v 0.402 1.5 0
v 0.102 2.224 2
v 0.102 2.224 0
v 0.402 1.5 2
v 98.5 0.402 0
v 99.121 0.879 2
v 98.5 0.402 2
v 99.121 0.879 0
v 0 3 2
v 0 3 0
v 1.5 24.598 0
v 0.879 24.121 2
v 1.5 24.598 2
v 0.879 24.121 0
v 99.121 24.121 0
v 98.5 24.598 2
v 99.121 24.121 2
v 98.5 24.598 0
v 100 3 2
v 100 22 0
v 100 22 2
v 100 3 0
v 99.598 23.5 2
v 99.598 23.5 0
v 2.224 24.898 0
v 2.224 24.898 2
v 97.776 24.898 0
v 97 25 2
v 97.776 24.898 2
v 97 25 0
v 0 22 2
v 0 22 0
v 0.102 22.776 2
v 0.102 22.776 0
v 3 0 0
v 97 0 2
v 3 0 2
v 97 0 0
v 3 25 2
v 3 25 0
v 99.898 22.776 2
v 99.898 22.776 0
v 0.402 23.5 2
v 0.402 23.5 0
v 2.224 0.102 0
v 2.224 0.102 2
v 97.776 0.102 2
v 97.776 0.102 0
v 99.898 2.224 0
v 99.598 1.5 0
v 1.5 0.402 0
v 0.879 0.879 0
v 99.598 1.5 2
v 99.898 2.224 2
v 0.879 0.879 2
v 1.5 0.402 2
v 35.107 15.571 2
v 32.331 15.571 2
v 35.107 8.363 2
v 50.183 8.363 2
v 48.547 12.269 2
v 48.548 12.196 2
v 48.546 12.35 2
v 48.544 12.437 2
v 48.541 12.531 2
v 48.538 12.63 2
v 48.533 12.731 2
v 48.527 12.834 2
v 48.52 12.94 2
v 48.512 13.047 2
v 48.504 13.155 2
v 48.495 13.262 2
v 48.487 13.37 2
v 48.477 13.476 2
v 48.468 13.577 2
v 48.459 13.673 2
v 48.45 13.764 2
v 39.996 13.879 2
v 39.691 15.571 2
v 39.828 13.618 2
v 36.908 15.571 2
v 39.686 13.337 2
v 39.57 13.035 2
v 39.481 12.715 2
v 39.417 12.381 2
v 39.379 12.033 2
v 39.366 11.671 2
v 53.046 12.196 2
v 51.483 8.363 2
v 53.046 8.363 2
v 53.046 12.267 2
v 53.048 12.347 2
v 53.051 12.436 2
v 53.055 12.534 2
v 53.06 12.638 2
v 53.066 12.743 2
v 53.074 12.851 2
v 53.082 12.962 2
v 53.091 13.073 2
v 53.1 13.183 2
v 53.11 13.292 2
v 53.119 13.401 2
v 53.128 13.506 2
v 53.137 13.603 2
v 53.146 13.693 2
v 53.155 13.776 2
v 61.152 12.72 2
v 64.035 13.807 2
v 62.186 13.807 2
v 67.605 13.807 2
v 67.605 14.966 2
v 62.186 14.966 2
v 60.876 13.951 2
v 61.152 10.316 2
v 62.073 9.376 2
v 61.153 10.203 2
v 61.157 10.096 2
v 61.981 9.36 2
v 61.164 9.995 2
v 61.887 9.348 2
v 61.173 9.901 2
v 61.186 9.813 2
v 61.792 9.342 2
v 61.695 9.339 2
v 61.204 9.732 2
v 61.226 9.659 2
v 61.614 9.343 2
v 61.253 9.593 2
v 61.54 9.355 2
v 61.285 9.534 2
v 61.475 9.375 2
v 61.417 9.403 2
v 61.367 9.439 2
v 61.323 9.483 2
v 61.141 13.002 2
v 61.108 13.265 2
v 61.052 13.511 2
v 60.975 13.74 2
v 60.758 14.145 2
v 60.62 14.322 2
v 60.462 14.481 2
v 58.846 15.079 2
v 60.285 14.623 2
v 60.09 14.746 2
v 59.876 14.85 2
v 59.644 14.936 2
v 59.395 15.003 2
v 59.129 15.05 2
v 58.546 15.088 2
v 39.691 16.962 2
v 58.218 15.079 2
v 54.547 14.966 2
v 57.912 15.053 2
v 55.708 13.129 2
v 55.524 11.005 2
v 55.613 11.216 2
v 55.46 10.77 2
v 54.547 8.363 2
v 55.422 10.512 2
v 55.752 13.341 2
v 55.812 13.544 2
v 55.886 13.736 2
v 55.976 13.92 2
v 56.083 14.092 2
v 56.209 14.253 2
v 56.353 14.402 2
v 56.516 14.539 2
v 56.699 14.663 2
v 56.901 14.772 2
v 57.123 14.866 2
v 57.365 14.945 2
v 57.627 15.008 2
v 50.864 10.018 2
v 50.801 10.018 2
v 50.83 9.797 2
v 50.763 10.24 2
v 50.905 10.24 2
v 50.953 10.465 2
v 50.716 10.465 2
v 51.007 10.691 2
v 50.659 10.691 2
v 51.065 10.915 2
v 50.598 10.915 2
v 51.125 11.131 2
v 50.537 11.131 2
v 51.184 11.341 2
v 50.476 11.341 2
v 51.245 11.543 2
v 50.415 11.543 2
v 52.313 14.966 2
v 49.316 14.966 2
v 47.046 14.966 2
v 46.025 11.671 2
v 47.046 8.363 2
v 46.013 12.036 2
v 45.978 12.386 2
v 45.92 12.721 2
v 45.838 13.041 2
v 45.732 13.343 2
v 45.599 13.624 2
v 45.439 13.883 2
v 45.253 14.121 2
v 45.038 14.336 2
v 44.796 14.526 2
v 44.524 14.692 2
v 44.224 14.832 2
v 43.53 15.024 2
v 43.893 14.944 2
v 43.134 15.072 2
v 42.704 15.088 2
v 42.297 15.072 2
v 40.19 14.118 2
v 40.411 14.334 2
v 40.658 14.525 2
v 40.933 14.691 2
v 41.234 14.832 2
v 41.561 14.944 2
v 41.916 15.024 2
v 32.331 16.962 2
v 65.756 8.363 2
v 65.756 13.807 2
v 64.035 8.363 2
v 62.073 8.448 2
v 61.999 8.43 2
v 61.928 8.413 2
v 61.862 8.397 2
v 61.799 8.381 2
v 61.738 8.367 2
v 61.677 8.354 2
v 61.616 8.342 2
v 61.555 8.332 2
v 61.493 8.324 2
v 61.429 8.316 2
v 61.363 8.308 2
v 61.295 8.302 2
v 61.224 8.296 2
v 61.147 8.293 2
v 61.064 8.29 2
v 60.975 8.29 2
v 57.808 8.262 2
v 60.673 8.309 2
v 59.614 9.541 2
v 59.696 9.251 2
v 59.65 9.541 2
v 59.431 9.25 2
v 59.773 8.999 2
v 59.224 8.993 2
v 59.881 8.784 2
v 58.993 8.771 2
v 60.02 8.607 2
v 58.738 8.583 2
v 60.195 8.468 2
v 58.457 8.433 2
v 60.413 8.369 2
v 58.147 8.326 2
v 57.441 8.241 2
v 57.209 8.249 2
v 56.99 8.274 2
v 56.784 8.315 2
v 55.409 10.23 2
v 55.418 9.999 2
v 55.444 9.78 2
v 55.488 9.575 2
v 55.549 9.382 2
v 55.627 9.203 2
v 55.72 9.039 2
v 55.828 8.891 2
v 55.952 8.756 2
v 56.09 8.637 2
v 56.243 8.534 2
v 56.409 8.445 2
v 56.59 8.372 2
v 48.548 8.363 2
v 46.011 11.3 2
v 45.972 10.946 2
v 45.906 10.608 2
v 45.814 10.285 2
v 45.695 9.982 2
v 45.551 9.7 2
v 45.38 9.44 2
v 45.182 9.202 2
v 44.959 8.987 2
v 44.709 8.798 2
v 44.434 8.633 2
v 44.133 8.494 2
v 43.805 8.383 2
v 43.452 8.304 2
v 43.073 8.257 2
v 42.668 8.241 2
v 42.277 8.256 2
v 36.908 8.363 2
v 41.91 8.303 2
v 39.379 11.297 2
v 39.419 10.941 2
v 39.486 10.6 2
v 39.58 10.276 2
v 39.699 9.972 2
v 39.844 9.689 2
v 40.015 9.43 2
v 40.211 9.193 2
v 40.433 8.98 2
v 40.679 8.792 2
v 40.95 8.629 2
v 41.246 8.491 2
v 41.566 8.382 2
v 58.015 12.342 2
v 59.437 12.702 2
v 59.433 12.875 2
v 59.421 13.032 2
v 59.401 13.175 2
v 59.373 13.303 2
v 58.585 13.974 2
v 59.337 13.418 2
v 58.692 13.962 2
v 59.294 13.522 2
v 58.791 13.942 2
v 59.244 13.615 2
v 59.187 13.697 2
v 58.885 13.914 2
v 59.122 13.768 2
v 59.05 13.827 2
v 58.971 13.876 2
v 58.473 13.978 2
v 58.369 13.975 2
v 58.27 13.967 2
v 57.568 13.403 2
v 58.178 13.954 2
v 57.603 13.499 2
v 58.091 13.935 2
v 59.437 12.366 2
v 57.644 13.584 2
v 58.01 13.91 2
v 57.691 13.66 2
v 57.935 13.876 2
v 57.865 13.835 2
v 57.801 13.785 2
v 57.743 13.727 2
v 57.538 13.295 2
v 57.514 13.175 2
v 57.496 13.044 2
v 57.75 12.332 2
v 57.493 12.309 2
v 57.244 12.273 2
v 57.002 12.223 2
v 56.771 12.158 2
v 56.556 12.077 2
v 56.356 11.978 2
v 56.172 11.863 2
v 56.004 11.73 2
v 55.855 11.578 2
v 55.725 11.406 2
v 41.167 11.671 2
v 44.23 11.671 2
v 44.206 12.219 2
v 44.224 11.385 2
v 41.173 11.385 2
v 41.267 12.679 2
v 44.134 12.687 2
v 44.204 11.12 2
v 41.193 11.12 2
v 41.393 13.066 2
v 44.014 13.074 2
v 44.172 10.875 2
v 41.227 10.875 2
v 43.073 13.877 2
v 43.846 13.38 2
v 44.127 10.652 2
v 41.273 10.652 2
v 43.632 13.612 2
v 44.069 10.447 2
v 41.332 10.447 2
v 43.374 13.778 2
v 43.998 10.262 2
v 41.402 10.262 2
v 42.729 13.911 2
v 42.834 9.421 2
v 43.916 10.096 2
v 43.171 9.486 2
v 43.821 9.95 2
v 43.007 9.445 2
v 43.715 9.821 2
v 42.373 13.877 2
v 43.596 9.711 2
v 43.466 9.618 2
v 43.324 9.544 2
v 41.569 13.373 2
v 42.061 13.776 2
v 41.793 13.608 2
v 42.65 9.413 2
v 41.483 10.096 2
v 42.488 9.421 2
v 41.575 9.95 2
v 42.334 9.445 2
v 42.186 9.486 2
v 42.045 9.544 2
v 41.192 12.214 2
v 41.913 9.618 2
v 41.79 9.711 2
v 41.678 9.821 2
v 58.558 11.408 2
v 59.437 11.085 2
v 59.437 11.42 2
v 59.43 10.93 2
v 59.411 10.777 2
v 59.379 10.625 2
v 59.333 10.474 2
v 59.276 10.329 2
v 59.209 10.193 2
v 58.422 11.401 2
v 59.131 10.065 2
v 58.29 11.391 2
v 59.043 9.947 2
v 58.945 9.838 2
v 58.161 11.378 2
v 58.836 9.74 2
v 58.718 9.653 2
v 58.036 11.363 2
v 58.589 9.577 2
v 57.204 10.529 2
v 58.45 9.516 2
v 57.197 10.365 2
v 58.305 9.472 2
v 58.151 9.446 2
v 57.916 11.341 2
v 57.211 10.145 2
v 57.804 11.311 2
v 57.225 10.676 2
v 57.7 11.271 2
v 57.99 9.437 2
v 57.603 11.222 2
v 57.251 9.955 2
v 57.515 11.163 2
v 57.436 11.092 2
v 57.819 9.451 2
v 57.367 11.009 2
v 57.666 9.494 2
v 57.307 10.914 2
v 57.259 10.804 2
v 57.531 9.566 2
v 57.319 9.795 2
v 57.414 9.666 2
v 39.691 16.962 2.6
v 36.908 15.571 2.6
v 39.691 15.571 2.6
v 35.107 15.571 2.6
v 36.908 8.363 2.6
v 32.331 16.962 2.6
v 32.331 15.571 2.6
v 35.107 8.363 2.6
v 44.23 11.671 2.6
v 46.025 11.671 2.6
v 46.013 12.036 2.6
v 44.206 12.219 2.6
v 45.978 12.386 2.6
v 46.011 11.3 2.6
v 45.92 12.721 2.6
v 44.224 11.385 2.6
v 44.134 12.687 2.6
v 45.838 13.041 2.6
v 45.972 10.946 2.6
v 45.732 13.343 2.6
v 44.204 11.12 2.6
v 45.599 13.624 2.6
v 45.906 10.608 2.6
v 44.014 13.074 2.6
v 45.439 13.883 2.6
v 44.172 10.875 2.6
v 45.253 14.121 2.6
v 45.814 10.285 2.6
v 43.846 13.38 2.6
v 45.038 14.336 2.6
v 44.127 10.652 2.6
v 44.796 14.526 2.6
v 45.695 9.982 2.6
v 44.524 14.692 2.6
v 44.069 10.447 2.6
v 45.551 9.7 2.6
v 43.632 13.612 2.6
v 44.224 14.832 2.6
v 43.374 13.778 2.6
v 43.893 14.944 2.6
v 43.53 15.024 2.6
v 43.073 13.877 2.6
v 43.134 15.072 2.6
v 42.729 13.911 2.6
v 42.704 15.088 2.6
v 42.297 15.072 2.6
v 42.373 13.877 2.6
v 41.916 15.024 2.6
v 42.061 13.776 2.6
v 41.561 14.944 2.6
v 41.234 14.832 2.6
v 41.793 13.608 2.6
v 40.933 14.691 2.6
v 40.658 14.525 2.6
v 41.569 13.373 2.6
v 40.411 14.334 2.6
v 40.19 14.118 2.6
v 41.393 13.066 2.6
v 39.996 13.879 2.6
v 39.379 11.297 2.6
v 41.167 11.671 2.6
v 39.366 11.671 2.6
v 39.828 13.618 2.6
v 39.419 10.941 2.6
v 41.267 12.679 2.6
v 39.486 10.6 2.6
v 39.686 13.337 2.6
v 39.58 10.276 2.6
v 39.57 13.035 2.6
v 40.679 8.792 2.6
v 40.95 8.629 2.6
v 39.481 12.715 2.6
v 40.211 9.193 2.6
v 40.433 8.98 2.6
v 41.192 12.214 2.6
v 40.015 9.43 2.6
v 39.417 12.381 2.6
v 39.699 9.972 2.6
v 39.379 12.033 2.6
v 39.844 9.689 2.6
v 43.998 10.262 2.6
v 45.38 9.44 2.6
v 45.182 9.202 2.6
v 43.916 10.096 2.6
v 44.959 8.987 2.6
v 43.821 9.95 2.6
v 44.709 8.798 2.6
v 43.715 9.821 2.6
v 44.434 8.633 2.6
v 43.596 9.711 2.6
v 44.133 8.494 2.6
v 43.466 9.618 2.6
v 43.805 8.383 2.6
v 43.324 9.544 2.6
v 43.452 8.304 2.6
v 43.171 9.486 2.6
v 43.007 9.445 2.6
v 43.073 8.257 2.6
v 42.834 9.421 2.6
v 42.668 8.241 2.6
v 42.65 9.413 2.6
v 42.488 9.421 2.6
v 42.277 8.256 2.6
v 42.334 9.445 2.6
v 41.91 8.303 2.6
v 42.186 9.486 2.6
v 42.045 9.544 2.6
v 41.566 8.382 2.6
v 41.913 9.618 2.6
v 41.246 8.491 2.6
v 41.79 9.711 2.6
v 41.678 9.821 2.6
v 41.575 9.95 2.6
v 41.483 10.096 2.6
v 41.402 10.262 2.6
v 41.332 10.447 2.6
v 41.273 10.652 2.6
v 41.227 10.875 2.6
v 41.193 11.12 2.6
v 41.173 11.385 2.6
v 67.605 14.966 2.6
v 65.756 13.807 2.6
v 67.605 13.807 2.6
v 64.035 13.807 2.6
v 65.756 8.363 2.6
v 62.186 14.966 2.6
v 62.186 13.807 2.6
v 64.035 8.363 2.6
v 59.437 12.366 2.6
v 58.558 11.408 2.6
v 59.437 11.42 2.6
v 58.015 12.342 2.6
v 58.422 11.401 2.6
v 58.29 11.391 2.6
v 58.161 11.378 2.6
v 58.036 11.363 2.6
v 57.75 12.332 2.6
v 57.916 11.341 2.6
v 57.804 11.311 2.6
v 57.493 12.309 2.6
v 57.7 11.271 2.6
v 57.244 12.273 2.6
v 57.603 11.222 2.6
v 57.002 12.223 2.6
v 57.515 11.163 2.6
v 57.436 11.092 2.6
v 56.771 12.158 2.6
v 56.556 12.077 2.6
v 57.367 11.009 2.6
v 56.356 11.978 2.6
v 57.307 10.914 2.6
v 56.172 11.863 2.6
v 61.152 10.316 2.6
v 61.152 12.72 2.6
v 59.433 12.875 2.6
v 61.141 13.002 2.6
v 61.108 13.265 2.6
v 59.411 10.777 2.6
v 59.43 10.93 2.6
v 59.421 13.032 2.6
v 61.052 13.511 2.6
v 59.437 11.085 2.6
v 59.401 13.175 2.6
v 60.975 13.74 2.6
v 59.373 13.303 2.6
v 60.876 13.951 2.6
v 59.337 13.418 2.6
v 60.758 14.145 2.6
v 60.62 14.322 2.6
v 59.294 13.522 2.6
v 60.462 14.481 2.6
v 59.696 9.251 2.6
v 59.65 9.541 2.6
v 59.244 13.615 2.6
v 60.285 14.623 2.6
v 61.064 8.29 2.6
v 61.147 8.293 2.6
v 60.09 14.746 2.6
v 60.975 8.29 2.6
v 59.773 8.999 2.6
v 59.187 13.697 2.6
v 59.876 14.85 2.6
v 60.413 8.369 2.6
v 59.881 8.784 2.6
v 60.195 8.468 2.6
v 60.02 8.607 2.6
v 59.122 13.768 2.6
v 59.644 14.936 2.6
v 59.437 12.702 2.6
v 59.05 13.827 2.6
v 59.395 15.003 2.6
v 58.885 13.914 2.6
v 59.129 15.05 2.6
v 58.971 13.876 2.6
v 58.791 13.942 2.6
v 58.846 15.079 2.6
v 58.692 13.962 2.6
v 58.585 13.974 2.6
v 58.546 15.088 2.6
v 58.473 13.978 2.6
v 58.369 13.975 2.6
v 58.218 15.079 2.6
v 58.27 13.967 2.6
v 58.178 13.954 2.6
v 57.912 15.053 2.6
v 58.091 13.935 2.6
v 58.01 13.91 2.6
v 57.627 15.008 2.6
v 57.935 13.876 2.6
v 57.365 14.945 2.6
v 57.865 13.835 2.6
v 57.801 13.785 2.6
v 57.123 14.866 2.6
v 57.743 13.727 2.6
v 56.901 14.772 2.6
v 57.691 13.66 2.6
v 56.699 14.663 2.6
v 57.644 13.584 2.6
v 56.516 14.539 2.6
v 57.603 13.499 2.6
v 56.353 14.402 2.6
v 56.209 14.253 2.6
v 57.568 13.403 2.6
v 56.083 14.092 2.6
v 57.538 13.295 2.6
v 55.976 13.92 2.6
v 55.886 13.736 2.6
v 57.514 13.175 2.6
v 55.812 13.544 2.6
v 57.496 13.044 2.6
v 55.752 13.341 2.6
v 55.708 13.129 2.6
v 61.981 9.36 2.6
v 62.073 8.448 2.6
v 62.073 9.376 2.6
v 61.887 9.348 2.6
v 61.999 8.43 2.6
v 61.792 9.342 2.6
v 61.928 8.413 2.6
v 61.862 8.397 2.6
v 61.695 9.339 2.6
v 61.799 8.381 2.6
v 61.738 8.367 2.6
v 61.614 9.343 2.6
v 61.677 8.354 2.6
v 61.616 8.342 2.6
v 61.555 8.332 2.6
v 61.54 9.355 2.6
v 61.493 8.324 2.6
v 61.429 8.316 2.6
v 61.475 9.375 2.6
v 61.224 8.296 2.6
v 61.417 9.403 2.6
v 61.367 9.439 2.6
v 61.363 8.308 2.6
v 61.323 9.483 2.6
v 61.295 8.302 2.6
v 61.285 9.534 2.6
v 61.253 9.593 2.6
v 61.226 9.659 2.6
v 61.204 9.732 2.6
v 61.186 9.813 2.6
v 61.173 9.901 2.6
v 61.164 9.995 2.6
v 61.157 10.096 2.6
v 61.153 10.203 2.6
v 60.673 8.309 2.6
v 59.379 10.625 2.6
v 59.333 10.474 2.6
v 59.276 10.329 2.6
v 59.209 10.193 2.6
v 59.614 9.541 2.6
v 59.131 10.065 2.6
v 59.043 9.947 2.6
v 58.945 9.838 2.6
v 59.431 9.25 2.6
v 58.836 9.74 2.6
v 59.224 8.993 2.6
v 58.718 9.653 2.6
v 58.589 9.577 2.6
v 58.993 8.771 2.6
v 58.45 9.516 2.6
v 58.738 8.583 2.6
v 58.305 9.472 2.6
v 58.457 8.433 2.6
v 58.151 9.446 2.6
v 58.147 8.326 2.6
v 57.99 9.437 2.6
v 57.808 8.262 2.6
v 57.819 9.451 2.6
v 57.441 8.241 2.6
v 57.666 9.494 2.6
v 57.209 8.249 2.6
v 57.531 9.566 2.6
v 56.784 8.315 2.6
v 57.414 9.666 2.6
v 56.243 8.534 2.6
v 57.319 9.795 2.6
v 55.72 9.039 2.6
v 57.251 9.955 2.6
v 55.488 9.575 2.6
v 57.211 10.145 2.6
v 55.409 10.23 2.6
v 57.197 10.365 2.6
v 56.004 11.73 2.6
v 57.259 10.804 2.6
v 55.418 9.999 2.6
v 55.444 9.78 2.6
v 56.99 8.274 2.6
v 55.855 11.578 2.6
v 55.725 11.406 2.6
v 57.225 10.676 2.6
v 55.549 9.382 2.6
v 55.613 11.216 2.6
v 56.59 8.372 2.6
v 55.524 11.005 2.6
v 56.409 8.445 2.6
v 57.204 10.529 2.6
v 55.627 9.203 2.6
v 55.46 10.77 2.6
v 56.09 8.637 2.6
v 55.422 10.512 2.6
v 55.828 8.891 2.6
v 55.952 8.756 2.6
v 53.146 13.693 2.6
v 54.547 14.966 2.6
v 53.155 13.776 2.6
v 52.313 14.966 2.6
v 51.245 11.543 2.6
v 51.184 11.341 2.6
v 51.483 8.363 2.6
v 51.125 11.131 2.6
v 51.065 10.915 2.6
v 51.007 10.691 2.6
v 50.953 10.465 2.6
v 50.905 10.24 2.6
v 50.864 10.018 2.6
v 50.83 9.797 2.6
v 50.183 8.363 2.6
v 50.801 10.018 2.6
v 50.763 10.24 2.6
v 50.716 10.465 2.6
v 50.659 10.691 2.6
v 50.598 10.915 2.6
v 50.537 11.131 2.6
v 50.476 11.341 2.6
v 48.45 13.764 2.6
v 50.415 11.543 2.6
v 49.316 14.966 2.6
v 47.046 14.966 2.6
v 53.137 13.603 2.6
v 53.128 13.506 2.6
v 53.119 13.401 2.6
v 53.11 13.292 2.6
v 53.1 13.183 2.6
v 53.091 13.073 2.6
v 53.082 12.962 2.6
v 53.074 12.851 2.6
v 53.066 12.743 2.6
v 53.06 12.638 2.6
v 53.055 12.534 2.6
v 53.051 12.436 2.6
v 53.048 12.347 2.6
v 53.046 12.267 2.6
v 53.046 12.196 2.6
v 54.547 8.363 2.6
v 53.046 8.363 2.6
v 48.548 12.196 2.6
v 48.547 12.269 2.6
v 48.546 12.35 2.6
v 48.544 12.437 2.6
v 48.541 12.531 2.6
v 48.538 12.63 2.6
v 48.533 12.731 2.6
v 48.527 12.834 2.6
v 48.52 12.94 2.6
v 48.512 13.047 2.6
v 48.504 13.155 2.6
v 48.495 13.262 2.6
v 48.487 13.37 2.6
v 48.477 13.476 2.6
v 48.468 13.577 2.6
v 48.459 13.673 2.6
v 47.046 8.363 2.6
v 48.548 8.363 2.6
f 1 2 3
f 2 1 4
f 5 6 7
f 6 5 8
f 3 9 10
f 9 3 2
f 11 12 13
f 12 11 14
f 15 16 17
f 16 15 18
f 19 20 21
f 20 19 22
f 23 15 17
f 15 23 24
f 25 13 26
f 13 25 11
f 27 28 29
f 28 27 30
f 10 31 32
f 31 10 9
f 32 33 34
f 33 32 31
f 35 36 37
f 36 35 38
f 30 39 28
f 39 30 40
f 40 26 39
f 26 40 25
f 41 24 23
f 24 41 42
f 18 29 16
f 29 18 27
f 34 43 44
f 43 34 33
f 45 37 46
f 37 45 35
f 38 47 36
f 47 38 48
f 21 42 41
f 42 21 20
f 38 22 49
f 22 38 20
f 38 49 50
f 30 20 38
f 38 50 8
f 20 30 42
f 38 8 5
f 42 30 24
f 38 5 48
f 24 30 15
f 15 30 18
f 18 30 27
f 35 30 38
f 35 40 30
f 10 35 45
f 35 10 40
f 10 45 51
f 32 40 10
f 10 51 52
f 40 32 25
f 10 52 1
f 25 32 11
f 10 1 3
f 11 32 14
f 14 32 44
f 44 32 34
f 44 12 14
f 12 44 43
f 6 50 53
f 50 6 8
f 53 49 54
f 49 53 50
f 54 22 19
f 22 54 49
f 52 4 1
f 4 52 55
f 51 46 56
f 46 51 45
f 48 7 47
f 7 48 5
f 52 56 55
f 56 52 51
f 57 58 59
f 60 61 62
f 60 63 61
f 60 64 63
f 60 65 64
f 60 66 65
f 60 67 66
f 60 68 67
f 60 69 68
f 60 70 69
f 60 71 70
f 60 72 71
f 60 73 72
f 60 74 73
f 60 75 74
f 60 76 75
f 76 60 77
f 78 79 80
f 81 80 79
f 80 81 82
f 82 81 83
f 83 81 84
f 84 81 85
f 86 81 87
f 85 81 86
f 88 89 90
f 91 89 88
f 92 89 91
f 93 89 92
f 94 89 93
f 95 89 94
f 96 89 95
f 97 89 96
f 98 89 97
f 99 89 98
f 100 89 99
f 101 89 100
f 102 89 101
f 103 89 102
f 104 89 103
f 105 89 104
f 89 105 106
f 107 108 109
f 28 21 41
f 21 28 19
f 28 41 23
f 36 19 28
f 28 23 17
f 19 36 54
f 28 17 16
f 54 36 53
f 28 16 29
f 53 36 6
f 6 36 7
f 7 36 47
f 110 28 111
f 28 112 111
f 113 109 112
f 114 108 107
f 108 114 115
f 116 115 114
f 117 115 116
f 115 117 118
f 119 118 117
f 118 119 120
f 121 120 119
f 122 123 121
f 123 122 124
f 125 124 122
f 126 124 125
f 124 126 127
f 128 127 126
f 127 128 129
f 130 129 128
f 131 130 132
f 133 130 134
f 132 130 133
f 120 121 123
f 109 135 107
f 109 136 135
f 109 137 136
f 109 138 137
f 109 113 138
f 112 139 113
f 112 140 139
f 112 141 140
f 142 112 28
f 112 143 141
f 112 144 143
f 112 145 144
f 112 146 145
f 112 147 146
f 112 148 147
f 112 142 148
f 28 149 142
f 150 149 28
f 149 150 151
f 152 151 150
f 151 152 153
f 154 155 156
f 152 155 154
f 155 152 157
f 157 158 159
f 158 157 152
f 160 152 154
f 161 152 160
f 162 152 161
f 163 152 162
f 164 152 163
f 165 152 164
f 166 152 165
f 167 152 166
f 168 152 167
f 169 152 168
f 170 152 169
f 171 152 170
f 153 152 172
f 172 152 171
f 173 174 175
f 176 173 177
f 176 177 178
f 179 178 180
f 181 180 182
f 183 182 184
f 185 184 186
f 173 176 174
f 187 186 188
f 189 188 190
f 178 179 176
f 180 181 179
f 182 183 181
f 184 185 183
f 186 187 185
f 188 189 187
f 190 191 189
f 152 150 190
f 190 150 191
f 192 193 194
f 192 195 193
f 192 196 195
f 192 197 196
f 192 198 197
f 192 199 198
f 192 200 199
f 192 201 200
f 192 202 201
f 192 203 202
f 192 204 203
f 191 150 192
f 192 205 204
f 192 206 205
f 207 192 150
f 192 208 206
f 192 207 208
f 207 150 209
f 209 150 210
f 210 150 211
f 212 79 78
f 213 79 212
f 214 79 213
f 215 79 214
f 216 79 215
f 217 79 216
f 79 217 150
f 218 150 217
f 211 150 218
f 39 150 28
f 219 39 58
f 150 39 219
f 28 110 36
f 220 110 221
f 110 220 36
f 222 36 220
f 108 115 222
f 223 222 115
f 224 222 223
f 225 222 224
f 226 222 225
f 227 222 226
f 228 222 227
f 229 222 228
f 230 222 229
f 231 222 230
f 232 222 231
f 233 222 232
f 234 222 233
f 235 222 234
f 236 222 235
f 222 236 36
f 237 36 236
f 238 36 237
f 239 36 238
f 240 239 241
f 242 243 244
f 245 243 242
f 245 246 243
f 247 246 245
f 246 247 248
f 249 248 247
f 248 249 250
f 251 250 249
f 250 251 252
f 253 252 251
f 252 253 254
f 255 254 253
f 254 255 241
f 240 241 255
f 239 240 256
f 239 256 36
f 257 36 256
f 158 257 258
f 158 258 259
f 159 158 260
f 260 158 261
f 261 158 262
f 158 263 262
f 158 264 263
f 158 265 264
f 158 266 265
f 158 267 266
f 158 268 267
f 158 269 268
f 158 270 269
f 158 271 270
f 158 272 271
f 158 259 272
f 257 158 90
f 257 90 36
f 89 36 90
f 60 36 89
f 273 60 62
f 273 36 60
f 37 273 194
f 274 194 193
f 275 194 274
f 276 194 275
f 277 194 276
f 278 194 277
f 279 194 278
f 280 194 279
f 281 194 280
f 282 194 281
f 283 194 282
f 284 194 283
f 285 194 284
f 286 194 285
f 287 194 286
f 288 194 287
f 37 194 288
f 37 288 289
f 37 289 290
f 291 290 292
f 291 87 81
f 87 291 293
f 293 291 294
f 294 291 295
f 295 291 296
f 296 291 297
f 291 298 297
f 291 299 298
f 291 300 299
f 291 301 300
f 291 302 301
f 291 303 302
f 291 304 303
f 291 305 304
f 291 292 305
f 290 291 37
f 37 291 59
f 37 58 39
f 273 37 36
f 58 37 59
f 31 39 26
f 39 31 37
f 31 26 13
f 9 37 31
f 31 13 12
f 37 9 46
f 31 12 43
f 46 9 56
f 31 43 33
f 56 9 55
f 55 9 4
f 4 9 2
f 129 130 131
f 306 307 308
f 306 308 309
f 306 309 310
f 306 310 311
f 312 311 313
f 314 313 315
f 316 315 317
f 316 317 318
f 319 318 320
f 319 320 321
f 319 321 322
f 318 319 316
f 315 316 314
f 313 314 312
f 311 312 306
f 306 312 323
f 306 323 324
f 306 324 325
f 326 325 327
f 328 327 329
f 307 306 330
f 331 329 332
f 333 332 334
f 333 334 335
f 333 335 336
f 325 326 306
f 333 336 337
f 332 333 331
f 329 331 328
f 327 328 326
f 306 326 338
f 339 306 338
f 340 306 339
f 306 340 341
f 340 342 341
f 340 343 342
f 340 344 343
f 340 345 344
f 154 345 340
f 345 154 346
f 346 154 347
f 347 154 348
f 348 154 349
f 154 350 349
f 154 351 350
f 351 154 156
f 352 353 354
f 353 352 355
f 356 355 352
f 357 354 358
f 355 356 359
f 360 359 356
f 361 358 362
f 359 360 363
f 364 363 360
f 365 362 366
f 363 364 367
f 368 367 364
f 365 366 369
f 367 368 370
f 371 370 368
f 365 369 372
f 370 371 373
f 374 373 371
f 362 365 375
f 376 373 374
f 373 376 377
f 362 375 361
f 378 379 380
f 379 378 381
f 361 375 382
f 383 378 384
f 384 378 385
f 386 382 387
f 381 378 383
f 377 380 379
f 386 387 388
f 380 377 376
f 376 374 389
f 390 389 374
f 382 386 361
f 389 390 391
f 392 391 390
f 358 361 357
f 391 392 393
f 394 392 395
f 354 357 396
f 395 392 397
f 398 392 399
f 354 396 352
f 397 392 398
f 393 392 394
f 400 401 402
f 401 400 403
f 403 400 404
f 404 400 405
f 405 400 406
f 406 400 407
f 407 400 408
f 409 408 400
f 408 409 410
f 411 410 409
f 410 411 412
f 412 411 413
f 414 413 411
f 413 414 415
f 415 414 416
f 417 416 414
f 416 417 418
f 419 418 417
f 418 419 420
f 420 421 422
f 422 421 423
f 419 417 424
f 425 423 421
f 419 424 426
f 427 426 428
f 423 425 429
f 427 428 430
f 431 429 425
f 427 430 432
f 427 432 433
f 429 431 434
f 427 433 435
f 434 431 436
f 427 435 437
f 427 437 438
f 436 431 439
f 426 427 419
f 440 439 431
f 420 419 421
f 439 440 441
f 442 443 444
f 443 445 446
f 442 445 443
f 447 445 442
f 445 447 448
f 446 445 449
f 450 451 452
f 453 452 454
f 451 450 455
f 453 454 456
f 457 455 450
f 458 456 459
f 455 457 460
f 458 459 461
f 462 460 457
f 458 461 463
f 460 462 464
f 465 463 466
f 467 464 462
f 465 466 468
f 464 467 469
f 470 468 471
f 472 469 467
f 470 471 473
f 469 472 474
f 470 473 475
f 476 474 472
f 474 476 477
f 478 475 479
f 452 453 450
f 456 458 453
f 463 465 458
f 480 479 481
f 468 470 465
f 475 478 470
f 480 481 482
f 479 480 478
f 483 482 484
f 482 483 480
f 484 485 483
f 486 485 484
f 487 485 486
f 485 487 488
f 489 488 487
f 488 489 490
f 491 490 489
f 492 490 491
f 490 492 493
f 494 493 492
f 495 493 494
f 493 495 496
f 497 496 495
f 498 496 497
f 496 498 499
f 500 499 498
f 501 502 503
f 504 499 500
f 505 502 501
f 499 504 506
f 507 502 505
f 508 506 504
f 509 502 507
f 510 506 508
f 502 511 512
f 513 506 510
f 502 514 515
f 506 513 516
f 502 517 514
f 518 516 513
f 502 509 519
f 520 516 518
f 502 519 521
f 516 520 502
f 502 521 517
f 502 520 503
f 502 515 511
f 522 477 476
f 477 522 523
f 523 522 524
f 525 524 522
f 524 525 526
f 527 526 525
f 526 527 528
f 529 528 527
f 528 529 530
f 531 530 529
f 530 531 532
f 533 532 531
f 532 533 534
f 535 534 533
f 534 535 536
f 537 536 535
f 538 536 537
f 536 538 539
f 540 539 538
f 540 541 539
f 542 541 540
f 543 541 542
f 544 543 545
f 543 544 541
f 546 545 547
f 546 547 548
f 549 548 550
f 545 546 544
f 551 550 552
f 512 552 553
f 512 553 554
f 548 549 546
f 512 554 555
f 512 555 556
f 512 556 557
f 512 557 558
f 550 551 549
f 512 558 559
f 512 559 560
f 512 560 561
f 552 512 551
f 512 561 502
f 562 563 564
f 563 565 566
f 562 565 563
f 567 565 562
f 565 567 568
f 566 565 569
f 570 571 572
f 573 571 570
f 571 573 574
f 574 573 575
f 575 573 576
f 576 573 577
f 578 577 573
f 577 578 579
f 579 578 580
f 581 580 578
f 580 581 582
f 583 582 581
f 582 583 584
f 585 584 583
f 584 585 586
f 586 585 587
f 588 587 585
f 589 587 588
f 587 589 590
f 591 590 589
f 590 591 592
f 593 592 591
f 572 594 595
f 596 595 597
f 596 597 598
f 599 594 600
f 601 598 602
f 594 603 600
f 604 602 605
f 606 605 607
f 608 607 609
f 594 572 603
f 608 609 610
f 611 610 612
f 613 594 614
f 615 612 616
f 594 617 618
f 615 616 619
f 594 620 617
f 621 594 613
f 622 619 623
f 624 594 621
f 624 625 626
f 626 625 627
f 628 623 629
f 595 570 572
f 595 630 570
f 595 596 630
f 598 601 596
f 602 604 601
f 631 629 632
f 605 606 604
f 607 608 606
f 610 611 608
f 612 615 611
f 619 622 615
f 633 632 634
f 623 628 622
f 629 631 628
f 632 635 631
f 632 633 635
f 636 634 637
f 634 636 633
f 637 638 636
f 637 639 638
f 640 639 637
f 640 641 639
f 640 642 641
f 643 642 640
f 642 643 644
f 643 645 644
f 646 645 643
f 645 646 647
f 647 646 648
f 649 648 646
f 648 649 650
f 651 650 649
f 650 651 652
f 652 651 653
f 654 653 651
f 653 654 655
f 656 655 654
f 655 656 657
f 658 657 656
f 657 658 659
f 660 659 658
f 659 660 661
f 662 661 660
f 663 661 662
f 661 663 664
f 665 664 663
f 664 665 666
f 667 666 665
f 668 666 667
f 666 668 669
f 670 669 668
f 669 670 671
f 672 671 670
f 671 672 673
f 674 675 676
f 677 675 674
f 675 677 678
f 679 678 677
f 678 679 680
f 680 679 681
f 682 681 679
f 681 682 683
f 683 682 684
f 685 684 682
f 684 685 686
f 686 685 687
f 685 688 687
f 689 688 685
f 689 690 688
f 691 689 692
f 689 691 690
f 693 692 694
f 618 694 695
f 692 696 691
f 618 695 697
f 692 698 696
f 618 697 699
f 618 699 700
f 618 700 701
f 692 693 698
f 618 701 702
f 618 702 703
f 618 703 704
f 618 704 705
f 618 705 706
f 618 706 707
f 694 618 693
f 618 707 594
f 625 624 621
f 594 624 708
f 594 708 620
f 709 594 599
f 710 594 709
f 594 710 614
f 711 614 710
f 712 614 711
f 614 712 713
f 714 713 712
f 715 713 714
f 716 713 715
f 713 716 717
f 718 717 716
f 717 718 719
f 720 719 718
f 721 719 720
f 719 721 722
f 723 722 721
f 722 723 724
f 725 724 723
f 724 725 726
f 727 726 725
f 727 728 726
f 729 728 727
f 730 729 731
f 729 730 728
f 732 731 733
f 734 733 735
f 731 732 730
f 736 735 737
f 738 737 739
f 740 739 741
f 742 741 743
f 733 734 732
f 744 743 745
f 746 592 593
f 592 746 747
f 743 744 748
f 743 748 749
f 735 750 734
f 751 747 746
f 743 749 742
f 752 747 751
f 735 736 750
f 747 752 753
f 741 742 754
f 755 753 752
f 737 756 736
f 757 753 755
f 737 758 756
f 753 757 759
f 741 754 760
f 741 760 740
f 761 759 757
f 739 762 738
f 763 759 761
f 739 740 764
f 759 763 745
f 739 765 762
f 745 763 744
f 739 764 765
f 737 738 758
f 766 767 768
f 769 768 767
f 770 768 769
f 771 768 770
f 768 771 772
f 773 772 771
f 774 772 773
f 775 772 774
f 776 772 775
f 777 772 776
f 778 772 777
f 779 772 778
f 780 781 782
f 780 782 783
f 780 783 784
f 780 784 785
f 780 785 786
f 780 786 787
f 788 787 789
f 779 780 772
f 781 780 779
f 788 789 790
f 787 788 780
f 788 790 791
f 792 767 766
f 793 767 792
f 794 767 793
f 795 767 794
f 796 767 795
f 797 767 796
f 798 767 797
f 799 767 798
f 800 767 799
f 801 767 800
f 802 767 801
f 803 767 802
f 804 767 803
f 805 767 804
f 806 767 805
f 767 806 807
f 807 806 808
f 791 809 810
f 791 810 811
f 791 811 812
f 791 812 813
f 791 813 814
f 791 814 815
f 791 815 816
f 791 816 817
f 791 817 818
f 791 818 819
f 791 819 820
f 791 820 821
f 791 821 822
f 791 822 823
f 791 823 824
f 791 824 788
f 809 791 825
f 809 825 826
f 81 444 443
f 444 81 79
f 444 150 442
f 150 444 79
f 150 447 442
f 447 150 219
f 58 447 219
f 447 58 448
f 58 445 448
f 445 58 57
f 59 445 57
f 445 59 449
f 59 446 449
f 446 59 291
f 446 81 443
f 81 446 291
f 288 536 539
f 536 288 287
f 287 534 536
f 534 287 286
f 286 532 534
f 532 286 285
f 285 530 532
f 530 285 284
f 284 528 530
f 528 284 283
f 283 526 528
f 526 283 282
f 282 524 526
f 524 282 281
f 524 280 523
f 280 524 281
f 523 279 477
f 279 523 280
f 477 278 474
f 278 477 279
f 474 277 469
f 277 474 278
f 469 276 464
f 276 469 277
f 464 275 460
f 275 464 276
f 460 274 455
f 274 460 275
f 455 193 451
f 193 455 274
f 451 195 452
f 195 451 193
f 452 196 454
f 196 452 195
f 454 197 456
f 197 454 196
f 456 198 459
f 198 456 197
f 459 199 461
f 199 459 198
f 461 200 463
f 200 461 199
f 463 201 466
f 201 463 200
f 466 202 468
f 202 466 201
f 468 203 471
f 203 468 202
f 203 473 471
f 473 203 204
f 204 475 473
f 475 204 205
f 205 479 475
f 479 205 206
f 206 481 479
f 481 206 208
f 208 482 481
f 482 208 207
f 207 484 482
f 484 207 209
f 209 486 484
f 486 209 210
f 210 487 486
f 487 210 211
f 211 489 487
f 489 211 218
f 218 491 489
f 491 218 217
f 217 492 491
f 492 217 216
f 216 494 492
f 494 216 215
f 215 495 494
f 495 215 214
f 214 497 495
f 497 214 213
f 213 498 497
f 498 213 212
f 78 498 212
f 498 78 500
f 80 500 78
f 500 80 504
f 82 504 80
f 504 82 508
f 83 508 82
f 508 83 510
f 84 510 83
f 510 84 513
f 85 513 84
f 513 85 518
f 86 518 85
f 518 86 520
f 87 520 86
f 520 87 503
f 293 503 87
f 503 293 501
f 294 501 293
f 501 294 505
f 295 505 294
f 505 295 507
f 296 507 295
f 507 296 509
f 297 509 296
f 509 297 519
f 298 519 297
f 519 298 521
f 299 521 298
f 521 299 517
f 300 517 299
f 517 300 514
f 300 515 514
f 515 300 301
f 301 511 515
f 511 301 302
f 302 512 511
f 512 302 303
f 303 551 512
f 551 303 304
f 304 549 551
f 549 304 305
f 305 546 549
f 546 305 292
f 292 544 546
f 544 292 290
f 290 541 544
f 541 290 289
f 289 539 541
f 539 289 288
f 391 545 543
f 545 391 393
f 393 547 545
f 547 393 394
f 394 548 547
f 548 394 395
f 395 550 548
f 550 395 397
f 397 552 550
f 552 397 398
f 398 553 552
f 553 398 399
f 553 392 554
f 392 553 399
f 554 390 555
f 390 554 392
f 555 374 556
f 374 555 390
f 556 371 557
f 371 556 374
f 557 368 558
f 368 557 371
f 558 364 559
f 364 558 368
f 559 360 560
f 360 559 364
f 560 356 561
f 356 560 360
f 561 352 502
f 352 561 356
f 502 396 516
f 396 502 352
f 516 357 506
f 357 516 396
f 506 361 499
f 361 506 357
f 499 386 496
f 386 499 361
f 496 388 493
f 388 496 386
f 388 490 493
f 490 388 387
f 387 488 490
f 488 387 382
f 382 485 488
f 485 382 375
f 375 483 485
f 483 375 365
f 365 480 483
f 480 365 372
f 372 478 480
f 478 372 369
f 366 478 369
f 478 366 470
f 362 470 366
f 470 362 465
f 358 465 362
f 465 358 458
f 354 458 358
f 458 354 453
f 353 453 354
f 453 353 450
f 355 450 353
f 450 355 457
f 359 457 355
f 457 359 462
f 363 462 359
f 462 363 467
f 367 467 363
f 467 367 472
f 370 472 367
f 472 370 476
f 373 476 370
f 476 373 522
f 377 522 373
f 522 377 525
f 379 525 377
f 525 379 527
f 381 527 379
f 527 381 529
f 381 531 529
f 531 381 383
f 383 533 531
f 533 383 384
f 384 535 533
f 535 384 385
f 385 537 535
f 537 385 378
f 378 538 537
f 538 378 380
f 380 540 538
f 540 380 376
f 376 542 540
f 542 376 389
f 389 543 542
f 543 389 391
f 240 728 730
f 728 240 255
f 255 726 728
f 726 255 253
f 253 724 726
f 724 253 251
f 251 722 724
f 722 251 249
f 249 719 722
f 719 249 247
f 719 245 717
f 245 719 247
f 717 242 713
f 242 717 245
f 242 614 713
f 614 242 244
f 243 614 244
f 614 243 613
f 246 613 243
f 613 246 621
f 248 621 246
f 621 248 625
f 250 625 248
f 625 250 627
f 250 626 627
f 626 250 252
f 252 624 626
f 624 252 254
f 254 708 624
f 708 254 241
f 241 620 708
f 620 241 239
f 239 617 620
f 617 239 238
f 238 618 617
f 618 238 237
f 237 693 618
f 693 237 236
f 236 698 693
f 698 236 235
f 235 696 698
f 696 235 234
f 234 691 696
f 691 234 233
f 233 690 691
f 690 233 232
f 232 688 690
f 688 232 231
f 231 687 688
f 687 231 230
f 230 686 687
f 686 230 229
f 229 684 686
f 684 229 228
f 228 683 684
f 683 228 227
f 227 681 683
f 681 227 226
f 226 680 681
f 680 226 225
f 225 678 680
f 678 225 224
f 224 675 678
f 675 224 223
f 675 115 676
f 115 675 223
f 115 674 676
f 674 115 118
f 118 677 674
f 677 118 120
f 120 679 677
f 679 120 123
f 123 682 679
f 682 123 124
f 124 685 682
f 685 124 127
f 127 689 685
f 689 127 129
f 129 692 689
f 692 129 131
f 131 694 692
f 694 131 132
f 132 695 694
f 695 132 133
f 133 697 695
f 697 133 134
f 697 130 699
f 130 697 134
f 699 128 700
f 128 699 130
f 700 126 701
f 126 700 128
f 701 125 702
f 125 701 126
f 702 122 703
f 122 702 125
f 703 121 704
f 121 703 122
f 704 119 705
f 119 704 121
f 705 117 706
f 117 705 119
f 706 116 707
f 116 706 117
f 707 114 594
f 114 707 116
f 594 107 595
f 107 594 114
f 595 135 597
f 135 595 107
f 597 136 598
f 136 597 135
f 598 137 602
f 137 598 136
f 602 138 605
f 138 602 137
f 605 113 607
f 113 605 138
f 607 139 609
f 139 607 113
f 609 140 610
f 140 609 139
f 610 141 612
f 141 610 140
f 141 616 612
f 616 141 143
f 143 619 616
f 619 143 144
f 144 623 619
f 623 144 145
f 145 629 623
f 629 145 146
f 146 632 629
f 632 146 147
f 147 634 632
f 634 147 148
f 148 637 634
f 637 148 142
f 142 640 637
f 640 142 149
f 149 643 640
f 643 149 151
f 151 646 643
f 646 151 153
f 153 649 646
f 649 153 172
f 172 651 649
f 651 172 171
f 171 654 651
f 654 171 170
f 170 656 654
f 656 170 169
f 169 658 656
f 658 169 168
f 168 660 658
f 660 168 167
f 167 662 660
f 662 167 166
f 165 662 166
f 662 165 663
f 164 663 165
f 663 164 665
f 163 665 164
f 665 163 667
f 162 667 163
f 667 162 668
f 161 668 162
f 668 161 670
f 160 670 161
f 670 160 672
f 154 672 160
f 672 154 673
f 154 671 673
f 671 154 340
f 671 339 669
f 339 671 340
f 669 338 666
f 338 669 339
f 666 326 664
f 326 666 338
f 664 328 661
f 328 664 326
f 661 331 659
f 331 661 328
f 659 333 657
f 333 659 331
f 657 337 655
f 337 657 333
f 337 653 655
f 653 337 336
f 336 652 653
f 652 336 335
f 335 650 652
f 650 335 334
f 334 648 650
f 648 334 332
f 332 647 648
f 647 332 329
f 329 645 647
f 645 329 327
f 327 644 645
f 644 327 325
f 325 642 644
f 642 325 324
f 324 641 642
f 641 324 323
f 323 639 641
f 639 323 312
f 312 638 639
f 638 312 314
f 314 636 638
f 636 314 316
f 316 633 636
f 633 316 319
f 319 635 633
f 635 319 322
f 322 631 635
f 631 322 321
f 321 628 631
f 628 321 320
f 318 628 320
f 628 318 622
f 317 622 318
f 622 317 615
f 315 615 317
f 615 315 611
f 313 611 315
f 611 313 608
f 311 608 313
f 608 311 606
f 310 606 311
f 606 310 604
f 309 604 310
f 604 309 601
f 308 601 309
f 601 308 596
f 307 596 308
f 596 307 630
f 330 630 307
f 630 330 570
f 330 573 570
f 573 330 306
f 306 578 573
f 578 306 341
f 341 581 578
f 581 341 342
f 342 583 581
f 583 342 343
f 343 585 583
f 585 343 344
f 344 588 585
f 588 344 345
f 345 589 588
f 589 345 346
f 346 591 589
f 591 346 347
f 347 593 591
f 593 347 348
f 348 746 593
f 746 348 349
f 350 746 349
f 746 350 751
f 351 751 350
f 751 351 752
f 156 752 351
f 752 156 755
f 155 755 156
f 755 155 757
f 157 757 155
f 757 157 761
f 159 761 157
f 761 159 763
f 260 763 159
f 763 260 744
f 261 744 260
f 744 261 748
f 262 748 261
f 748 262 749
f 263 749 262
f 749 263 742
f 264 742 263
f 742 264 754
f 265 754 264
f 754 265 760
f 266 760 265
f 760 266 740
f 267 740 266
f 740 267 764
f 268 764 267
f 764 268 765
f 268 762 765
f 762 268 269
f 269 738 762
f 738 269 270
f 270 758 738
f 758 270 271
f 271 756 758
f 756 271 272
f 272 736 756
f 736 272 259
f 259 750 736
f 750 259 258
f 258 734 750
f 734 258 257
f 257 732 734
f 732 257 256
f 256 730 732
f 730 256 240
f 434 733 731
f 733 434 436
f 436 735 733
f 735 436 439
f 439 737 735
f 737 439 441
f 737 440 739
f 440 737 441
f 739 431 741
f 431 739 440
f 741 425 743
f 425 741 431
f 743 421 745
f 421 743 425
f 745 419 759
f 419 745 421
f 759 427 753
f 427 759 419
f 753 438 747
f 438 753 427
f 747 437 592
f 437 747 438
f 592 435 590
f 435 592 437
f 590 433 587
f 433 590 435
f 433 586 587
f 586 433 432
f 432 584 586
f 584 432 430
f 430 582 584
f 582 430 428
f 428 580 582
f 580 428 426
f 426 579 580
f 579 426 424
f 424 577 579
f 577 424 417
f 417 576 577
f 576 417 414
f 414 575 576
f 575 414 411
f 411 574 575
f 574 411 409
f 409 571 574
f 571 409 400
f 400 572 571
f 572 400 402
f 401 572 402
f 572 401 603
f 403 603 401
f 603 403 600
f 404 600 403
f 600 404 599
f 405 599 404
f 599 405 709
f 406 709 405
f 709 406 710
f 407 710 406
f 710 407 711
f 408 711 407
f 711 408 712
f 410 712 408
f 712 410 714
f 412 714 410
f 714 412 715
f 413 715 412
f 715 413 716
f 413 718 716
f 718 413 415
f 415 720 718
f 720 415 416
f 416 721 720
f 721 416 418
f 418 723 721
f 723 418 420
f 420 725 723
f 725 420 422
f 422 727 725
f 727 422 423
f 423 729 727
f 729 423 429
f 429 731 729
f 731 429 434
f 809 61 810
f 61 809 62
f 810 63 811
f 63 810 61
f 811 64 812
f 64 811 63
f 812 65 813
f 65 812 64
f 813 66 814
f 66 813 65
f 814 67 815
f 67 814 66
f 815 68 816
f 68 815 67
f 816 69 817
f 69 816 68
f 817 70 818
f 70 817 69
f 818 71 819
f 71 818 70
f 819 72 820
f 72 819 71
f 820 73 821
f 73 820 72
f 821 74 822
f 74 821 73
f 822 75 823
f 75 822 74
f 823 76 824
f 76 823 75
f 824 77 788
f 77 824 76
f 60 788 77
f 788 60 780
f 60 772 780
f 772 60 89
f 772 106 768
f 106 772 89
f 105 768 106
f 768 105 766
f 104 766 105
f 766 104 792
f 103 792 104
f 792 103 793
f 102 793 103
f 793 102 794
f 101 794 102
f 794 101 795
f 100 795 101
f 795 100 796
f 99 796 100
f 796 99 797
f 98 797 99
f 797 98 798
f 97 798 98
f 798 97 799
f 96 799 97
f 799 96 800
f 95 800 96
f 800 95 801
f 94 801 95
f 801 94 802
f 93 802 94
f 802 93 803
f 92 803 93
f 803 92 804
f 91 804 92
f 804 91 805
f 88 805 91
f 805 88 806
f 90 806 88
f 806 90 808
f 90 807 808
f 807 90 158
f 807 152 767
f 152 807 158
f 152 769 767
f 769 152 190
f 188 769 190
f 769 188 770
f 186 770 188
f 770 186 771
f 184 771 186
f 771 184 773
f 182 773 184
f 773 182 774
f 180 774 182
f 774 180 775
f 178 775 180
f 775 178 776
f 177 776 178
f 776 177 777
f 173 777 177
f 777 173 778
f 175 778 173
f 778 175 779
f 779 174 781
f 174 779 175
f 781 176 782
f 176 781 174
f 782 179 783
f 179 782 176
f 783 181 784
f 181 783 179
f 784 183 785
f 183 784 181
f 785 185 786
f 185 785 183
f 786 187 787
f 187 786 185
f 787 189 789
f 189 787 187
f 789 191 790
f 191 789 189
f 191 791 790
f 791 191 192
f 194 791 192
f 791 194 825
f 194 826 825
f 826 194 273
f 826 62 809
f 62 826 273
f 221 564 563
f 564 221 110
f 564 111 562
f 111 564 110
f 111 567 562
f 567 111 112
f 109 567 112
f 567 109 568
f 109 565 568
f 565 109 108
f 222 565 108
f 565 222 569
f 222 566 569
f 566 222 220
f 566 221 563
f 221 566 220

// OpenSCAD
// Text begins exactly at z=2 mm. The 0.6 mm raised lettering can be printed
// in a second filament by inserting a color change at that layer in the slicer.
tag_length = 100;
tag_height = 25;
tag_shape = "rounded";
tag_text_1 = "Томат";
tag_text_2 = "";
font_size = 9;
letter_relief = 0.6;
font_name = "Liberation Sans:style=Bold";

module base() {
  linear_extrude(height=2)
    if (tag_shape == "rounded")
      hull() {
        translate([3, 3]) circle(r=3, $fn=24);
        translate([tag_length-3, 3]) circle(r=3, $fn=24);
        translate([3, tag_height-3]) circle(r=3, $fn=24);
        translate([tag_length-3, tag_height-3]) circle(r=3, $fn=24);
      }
    else square([tag_length, tag_height]);
}

base();
translate([tag_length/2, tag_height/2 + (tag_text_2 == "" ? 0 : font_size*0.55), 2])
  linear_extrude(height=letter_relief)
    text(tag_text_1, size=font_size, font=font_name, halign="center", valign="center");
if (tag_text_2 != "")
  translate([tag_length/2, tag_height/2 - font_size*0.65, 2])
    linear_extrude(height=letter_relief)
      text(tag_text_2, size=font_size, font=font_name, halign="center", valign="center");
